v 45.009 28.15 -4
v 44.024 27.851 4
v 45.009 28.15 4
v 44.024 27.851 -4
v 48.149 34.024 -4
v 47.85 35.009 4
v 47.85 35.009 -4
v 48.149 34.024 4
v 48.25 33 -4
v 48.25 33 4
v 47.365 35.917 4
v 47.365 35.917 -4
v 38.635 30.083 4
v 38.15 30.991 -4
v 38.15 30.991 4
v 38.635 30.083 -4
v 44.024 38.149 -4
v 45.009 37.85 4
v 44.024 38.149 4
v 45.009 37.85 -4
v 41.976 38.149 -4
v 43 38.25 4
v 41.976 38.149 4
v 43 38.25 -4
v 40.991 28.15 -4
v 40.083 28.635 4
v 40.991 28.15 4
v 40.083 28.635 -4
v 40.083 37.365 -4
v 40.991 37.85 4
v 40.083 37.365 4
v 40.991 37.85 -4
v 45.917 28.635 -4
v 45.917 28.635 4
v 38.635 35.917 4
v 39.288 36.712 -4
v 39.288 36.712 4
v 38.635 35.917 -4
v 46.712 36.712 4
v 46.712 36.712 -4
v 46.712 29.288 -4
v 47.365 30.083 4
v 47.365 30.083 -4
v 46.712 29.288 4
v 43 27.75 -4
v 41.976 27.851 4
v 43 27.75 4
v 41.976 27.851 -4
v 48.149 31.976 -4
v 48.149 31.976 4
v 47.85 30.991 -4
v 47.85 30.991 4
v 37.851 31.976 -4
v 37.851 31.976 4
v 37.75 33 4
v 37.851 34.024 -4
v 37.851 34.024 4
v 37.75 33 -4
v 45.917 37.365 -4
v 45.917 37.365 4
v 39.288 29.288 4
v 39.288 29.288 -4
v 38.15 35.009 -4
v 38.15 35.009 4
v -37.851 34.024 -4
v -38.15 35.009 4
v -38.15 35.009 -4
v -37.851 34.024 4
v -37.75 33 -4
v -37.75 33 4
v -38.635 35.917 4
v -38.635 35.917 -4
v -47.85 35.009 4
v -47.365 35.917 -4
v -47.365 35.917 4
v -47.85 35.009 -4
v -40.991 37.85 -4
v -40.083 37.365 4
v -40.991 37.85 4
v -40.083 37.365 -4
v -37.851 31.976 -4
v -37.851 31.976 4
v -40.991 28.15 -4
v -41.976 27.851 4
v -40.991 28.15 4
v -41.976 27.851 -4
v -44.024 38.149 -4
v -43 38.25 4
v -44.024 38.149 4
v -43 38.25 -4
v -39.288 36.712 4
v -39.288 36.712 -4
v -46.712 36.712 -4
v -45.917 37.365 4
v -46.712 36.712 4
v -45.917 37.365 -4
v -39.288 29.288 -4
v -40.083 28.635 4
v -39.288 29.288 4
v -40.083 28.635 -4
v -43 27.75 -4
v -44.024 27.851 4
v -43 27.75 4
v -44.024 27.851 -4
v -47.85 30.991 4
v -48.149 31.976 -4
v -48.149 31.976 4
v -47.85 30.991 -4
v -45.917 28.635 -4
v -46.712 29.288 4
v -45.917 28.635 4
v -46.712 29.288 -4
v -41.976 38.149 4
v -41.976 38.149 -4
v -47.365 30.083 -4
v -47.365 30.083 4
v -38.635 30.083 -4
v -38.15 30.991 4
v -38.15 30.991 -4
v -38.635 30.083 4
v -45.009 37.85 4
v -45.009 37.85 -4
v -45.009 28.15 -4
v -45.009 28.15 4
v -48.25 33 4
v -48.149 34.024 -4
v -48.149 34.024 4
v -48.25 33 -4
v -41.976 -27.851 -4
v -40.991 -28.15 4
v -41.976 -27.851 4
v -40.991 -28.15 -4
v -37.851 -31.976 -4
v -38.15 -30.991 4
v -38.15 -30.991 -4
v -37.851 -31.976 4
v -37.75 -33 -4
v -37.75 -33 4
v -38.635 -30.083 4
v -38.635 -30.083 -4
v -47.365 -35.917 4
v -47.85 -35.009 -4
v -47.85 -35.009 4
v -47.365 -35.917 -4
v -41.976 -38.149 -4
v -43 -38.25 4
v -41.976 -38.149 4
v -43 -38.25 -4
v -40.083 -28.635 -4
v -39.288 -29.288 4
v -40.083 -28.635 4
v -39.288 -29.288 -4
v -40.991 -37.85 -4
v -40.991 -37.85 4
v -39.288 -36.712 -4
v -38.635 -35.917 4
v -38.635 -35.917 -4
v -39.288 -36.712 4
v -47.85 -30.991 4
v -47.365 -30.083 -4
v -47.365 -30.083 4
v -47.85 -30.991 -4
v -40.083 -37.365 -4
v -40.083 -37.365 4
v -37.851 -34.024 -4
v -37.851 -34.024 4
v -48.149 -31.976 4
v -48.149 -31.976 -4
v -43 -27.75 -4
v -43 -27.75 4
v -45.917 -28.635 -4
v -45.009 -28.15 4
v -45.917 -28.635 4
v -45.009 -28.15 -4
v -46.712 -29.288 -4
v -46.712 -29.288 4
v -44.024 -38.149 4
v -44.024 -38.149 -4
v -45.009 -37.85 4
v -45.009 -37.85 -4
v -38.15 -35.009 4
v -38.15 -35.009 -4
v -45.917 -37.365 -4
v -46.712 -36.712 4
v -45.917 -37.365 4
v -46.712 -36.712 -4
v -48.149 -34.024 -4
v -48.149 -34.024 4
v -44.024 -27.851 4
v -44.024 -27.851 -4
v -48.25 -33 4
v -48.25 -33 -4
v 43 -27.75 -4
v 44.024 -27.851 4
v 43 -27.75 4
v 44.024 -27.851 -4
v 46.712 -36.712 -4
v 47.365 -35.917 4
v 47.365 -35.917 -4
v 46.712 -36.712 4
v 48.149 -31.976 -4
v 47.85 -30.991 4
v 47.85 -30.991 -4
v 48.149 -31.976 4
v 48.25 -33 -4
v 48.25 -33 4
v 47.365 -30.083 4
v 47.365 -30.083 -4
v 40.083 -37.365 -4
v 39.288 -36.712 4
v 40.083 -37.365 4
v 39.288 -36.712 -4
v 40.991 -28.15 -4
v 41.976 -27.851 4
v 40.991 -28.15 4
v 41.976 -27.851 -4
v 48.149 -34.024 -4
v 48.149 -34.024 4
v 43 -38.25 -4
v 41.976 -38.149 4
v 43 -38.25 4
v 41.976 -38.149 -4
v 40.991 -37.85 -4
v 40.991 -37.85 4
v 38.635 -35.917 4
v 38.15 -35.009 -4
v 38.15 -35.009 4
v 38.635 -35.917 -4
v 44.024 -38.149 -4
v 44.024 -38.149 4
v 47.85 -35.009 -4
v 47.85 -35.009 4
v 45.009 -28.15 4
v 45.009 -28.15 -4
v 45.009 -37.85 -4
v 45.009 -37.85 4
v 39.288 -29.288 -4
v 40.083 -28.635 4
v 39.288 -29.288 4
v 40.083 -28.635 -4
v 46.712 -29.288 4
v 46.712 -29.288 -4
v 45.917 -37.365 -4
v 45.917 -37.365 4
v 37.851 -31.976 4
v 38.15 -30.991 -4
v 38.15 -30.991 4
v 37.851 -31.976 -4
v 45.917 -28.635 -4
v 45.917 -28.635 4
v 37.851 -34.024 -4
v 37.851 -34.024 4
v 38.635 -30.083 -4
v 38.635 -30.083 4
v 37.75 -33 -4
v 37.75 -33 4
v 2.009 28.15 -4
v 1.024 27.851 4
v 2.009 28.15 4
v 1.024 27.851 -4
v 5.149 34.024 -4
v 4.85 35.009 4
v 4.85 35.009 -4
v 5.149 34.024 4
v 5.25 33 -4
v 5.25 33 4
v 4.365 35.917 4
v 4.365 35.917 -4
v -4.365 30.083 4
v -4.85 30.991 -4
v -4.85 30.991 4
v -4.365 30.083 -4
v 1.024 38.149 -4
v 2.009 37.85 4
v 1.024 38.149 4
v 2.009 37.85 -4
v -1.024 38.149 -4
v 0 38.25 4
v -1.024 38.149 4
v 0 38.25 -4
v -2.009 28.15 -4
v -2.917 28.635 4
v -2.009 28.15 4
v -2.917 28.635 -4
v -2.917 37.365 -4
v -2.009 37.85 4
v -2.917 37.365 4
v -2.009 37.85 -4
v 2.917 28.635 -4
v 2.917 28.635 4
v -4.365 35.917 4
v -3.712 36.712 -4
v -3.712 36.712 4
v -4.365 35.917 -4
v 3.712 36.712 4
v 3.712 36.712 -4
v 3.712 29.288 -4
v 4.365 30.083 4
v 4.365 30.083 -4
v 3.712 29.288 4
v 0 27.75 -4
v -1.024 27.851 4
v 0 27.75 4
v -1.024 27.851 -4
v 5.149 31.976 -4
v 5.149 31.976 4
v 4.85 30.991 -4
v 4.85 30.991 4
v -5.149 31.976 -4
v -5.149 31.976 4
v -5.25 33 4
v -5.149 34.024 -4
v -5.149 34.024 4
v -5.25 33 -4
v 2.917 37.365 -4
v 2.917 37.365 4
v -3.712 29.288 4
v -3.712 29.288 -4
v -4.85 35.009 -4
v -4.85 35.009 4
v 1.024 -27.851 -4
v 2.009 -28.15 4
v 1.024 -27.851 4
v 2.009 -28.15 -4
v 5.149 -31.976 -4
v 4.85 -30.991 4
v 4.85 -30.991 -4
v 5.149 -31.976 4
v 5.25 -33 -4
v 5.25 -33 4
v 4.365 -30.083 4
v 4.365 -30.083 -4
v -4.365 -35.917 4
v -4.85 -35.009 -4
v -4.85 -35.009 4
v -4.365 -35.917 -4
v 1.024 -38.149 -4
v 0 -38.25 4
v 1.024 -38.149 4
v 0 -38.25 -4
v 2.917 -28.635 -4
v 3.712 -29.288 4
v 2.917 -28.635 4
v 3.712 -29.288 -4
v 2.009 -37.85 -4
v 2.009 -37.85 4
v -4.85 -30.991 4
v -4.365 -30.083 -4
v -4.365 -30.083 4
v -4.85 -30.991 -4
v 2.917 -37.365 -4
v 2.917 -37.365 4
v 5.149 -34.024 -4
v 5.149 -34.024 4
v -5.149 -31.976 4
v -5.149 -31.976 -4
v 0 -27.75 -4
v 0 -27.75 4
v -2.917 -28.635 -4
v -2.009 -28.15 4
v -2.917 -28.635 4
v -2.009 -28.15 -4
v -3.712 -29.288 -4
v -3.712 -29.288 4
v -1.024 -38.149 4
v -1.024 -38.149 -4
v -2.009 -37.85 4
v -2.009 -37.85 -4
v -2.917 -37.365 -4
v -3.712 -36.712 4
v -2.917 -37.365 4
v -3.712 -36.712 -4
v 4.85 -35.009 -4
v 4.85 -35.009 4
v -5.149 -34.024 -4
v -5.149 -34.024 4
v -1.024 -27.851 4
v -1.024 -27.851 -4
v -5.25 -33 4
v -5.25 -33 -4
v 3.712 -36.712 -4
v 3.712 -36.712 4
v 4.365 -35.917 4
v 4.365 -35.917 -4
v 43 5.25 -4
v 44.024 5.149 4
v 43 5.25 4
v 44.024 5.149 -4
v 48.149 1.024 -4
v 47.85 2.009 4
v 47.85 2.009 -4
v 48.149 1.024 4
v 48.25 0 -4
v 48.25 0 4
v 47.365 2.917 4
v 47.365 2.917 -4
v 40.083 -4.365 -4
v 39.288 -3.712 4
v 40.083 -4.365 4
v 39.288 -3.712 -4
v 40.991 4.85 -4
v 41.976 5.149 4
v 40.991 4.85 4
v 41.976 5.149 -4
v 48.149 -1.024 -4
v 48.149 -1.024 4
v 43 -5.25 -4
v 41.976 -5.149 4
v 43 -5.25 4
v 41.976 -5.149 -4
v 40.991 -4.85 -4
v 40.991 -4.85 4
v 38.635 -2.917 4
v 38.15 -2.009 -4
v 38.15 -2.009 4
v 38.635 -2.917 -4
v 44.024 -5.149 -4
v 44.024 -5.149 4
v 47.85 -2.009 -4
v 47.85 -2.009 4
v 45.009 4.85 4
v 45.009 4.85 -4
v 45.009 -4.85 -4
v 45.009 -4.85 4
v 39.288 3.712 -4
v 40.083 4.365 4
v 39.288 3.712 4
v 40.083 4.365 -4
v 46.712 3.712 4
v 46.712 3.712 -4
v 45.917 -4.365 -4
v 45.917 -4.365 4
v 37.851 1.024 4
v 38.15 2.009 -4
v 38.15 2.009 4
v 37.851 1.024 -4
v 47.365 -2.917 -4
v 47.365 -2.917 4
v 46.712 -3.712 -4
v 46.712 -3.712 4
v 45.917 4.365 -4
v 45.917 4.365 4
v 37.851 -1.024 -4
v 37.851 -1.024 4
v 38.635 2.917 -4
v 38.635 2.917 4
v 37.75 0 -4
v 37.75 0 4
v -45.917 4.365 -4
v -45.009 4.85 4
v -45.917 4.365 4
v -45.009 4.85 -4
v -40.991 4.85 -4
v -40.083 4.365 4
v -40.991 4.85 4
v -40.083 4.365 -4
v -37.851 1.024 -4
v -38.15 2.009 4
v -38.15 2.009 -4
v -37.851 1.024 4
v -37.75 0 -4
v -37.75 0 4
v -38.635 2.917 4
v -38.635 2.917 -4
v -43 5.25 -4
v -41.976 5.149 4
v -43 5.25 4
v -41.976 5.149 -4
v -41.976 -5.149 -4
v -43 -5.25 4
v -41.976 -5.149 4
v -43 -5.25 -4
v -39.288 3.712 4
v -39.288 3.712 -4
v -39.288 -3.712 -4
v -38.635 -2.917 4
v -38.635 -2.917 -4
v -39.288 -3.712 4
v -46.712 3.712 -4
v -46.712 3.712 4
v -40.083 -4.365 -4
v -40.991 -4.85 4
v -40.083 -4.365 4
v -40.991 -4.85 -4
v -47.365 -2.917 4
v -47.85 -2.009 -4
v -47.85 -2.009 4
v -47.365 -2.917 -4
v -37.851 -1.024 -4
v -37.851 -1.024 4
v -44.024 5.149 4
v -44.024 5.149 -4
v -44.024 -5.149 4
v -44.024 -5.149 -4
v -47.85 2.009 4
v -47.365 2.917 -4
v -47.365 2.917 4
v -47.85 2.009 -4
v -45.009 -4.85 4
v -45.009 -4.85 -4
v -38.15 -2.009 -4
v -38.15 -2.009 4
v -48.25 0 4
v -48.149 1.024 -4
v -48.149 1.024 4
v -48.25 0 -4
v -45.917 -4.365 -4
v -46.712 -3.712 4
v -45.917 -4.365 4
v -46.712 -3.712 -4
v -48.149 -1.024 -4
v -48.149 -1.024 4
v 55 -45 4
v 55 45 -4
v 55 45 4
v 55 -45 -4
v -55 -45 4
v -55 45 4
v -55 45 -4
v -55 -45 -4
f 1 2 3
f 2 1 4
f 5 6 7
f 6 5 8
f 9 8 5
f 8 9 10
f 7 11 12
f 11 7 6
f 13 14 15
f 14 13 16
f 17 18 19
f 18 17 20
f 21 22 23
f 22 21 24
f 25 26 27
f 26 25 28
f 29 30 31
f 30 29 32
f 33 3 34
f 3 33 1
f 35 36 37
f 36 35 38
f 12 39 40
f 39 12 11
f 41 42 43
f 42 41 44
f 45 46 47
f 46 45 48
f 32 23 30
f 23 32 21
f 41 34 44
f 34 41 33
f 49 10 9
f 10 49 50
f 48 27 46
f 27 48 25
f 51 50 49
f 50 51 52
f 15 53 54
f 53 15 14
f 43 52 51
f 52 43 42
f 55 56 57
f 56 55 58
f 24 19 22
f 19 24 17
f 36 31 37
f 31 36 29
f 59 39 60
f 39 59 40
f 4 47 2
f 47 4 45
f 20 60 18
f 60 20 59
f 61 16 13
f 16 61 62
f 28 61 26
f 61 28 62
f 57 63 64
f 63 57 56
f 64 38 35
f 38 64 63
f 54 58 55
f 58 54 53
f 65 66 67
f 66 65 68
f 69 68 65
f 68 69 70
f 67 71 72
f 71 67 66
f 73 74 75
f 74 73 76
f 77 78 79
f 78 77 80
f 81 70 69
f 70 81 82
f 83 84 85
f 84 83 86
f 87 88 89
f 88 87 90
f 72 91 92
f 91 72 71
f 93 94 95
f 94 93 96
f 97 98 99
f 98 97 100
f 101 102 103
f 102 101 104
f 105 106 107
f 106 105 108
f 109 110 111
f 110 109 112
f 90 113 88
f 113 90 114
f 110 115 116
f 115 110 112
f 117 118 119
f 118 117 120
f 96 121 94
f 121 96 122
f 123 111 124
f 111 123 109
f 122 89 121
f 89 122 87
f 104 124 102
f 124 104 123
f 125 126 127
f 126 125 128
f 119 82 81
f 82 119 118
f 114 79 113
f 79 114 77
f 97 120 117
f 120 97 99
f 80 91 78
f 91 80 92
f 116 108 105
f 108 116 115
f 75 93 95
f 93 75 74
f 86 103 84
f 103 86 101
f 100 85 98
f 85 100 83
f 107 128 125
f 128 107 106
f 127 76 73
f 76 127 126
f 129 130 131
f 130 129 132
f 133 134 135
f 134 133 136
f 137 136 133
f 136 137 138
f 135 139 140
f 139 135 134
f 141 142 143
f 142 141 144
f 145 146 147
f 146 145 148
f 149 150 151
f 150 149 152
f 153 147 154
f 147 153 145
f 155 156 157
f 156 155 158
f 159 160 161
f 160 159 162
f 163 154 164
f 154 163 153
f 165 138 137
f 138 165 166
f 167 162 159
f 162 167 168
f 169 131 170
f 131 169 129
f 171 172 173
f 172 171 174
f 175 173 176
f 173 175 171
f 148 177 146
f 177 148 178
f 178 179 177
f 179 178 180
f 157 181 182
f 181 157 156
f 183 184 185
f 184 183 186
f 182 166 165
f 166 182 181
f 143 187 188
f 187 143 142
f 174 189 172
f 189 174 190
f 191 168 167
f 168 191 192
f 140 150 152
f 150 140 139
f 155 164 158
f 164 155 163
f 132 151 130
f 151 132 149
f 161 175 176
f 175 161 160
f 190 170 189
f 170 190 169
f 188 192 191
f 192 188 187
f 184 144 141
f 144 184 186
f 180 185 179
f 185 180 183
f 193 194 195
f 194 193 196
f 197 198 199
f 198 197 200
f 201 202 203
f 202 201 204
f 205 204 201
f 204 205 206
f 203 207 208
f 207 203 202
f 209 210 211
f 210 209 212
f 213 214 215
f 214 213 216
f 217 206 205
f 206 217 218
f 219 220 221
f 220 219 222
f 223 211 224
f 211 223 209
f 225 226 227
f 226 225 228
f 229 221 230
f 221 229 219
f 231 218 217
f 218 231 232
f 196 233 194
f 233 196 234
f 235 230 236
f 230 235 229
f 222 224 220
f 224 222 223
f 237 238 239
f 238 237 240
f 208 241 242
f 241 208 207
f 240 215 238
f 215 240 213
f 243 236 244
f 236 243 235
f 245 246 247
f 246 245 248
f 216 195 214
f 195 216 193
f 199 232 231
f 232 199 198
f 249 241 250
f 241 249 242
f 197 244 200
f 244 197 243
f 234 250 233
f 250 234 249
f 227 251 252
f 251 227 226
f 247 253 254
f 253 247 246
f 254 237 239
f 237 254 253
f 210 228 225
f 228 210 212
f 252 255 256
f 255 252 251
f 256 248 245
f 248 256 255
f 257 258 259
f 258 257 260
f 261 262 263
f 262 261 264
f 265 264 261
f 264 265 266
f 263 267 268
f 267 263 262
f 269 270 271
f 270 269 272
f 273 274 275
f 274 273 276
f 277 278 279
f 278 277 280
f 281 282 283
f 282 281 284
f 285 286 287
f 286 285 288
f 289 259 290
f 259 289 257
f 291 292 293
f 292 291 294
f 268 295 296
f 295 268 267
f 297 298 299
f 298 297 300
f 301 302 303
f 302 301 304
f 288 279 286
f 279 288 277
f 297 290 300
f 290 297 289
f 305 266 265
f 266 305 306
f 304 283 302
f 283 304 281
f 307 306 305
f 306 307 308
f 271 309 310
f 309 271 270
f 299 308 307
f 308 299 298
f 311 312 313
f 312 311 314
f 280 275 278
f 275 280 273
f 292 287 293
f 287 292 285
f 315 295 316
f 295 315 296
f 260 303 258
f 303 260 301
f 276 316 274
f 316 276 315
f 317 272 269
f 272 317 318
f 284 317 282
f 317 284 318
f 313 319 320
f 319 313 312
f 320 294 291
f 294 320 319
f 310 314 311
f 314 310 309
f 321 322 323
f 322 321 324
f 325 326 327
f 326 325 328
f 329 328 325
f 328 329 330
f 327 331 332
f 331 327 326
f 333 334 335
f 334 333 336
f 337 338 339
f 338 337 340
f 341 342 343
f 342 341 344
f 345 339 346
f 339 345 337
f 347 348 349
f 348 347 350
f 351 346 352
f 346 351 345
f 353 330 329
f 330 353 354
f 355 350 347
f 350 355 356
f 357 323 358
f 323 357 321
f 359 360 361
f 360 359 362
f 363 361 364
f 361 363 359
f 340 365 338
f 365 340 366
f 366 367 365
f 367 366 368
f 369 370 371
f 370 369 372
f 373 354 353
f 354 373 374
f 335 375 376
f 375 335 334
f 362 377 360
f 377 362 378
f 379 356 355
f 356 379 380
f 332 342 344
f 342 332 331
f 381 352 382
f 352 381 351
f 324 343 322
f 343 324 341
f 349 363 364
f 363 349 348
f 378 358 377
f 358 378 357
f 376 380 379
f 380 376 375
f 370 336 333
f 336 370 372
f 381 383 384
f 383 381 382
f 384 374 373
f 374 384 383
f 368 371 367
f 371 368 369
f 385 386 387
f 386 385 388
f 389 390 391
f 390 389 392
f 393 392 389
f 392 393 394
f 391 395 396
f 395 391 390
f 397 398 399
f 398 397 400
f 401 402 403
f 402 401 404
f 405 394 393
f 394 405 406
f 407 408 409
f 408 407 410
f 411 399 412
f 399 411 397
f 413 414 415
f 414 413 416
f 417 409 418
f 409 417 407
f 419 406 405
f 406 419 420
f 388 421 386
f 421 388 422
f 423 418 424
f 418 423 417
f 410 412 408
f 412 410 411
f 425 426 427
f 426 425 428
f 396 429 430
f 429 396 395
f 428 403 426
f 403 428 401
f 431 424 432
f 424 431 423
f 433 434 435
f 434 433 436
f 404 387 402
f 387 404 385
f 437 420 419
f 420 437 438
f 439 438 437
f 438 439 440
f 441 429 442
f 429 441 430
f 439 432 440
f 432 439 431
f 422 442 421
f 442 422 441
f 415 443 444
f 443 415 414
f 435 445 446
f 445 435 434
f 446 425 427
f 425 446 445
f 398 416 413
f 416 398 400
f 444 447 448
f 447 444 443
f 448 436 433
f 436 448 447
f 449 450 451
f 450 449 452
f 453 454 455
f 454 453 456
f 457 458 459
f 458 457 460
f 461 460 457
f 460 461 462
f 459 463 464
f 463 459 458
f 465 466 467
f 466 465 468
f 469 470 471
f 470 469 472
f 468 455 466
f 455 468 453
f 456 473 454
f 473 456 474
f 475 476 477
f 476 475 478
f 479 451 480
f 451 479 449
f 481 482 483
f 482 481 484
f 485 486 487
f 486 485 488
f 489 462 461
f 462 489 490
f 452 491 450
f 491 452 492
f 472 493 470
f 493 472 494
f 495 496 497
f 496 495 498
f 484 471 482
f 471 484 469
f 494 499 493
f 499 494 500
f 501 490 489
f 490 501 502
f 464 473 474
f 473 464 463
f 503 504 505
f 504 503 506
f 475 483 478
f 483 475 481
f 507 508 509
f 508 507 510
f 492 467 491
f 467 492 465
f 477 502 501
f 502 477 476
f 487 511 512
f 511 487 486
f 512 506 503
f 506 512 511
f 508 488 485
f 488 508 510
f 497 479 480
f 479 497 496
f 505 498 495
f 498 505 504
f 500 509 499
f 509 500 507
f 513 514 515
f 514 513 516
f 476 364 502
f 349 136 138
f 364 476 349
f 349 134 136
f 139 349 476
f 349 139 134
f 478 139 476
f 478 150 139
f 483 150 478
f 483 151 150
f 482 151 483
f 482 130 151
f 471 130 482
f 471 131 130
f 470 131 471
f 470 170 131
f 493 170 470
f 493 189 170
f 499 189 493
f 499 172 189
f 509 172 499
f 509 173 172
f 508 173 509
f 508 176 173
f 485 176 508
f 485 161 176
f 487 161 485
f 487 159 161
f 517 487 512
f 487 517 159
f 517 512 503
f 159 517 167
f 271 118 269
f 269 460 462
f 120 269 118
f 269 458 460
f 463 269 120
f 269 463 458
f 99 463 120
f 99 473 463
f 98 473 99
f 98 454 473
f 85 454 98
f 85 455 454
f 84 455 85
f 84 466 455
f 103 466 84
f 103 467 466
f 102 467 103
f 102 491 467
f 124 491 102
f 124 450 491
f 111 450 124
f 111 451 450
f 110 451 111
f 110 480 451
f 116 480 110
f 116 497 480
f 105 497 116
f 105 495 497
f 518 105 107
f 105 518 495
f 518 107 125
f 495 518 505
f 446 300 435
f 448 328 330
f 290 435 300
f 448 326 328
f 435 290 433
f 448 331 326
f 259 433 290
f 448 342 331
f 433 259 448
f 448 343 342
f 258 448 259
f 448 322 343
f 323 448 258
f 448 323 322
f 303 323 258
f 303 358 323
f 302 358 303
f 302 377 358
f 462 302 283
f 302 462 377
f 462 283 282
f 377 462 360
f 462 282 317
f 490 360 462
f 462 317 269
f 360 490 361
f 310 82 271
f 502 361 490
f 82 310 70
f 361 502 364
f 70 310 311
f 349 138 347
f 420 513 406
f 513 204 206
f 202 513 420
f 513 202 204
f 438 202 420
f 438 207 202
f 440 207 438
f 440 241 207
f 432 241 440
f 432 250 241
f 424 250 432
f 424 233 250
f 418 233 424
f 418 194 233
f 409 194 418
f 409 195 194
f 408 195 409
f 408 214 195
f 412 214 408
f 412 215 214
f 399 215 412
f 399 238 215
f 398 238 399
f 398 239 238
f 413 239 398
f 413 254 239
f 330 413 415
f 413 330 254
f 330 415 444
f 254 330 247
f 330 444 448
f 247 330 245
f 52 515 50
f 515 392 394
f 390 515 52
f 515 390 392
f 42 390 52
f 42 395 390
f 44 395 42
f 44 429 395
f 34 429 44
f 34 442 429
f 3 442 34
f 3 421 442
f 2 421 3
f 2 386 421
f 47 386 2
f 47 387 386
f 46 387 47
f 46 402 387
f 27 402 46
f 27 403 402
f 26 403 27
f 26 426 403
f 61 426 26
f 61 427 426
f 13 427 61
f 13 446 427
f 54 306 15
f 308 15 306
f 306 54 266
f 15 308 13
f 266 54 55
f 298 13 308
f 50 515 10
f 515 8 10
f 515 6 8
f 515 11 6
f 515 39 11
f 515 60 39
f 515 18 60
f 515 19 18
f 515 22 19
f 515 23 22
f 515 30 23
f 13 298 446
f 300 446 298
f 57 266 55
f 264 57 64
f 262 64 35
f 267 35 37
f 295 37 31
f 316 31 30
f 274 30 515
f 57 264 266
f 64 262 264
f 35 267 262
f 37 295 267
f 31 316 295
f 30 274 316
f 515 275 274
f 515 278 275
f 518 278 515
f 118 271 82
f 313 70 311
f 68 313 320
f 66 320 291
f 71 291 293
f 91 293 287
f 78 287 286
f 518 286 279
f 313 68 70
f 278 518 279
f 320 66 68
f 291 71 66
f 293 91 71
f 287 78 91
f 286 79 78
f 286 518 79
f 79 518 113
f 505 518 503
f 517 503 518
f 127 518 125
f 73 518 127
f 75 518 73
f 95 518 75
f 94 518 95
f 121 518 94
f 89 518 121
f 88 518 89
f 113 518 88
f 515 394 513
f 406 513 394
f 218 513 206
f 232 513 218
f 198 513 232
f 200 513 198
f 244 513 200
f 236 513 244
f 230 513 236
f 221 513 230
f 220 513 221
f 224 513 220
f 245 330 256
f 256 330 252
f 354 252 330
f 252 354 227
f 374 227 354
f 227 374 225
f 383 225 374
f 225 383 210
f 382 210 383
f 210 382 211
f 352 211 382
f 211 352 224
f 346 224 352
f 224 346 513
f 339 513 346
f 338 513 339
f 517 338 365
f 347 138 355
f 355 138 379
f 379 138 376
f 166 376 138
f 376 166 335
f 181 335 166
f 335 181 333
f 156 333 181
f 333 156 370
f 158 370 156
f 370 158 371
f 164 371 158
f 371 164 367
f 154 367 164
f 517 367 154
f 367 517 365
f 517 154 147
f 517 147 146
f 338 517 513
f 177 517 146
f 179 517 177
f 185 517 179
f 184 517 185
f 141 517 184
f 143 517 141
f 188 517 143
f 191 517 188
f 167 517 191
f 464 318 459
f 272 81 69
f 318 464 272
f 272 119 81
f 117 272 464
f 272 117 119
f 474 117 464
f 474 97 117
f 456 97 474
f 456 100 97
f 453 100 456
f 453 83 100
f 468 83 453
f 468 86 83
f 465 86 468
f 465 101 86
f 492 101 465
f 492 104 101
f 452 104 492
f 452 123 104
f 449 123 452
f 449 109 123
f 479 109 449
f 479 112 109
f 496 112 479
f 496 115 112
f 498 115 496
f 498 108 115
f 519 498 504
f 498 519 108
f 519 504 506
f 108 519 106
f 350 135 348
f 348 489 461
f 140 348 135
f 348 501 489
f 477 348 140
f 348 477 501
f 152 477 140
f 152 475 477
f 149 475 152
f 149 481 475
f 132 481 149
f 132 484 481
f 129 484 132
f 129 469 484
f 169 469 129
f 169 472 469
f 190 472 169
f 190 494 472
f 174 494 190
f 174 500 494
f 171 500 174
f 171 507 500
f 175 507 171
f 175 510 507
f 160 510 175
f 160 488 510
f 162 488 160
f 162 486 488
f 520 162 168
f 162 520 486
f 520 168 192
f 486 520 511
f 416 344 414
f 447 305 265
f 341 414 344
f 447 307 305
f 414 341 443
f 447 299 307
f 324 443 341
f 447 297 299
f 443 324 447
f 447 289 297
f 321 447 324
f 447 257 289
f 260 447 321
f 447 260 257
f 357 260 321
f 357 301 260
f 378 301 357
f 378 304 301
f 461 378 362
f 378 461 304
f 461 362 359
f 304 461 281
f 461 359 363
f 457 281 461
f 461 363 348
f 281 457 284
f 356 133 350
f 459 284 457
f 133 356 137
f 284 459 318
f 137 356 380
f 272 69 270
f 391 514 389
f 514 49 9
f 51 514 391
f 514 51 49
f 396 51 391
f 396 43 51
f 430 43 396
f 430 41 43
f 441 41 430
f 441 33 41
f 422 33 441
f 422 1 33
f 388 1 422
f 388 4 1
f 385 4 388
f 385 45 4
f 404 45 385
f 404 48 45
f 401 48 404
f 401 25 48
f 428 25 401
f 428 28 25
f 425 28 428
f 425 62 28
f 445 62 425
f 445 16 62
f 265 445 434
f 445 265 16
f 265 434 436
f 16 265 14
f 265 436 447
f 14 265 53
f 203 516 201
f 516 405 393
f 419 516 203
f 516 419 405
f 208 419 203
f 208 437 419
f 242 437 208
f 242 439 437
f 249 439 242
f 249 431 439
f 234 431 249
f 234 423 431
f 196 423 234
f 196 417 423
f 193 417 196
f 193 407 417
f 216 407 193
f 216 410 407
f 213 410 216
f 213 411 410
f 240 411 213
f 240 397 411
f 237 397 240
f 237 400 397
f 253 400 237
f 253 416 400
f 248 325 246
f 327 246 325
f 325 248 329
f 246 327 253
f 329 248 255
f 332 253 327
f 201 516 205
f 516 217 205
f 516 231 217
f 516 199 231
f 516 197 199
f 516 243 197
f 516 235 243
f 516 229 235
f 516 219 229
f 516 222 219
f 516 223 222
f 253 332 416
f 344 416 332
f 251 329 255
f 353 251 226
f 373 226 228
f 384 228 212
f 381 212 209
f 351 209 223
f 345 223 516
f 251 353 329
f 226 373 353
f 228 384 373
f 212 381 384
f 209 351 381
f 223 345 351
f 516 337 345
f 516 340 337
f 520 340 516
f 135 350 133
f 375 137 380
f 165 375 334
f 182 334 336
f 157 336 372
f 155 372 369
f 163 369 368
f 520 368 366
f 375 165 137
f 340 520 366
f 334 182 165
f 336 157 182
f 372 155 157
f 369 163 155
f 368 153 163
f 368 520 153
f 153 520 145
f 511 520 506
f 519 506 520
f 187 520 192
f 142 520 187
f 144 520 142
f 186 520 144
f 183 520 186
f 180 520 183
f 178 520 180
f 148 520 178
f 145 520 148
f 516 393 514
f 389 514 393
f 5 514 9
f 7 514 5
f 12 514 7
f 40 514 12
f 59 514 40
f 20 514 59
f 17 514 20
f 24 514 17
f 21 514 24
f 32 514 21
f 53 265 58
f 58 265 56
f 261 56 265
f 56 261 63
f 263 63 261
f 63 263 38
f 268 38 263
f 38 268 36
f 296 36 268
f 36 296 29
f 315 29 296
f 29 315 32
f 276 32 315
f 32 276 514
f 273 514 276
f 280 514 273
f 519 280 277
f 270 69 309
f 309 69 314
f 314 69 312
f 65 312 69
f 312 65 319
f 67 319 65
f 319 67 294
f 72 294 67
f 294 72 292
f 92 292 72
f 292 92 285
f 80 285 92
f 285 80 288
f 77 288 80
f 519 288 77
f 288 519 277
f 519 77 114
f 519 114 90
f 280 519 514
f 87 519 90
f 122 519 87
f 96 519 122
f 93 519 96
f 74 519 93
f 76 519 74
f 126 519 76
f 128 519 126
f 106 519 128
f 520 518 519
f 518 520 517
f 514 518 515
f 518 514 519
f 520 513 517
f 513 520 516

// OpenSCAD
$fn = 32;

// ----------------------------------------------------------------------
// Corner plate 110 x 90 x 8
// 8 holes, centres taken from the edge offset
// ----------------------------------------------------------------------

// --- parameters (mm) ---
plate = [110, 90, 8];  // overall size (x, y, z)
holes = 8;             // number of holes the drawing asks for
hole_d = 10.5;         // hole diameter
edge = 12;             // hole centre offset from the plate edge

// --- derived feature positions (mm) ---
corner_x = plate[0] / 2 - edge;  // = 43   corner hole X
corner_y = plate[1] / 2 - edge;  // = 33   corner hole Y
feature_centers = [
  [corner_x, corner_y],
  [-corner_x, corner_y],
  [-corner_x, -corner_y],
  [corner_x, -corner_y],
  [0, corner_y],
  [0, -corner_y],
  [corner_x, 0],
  [-corner_x, 0]
];   // hole centres the loop below drills

// plate outline, every hole drilled through with the same cutters
difference() {
  cube(plate, center = true);
  for (centre = feature_centers)
    translate([centre[0], centre[1], 0])
      cylinder(d = hole_d, h = plate[2] + 2, center = true);
}
